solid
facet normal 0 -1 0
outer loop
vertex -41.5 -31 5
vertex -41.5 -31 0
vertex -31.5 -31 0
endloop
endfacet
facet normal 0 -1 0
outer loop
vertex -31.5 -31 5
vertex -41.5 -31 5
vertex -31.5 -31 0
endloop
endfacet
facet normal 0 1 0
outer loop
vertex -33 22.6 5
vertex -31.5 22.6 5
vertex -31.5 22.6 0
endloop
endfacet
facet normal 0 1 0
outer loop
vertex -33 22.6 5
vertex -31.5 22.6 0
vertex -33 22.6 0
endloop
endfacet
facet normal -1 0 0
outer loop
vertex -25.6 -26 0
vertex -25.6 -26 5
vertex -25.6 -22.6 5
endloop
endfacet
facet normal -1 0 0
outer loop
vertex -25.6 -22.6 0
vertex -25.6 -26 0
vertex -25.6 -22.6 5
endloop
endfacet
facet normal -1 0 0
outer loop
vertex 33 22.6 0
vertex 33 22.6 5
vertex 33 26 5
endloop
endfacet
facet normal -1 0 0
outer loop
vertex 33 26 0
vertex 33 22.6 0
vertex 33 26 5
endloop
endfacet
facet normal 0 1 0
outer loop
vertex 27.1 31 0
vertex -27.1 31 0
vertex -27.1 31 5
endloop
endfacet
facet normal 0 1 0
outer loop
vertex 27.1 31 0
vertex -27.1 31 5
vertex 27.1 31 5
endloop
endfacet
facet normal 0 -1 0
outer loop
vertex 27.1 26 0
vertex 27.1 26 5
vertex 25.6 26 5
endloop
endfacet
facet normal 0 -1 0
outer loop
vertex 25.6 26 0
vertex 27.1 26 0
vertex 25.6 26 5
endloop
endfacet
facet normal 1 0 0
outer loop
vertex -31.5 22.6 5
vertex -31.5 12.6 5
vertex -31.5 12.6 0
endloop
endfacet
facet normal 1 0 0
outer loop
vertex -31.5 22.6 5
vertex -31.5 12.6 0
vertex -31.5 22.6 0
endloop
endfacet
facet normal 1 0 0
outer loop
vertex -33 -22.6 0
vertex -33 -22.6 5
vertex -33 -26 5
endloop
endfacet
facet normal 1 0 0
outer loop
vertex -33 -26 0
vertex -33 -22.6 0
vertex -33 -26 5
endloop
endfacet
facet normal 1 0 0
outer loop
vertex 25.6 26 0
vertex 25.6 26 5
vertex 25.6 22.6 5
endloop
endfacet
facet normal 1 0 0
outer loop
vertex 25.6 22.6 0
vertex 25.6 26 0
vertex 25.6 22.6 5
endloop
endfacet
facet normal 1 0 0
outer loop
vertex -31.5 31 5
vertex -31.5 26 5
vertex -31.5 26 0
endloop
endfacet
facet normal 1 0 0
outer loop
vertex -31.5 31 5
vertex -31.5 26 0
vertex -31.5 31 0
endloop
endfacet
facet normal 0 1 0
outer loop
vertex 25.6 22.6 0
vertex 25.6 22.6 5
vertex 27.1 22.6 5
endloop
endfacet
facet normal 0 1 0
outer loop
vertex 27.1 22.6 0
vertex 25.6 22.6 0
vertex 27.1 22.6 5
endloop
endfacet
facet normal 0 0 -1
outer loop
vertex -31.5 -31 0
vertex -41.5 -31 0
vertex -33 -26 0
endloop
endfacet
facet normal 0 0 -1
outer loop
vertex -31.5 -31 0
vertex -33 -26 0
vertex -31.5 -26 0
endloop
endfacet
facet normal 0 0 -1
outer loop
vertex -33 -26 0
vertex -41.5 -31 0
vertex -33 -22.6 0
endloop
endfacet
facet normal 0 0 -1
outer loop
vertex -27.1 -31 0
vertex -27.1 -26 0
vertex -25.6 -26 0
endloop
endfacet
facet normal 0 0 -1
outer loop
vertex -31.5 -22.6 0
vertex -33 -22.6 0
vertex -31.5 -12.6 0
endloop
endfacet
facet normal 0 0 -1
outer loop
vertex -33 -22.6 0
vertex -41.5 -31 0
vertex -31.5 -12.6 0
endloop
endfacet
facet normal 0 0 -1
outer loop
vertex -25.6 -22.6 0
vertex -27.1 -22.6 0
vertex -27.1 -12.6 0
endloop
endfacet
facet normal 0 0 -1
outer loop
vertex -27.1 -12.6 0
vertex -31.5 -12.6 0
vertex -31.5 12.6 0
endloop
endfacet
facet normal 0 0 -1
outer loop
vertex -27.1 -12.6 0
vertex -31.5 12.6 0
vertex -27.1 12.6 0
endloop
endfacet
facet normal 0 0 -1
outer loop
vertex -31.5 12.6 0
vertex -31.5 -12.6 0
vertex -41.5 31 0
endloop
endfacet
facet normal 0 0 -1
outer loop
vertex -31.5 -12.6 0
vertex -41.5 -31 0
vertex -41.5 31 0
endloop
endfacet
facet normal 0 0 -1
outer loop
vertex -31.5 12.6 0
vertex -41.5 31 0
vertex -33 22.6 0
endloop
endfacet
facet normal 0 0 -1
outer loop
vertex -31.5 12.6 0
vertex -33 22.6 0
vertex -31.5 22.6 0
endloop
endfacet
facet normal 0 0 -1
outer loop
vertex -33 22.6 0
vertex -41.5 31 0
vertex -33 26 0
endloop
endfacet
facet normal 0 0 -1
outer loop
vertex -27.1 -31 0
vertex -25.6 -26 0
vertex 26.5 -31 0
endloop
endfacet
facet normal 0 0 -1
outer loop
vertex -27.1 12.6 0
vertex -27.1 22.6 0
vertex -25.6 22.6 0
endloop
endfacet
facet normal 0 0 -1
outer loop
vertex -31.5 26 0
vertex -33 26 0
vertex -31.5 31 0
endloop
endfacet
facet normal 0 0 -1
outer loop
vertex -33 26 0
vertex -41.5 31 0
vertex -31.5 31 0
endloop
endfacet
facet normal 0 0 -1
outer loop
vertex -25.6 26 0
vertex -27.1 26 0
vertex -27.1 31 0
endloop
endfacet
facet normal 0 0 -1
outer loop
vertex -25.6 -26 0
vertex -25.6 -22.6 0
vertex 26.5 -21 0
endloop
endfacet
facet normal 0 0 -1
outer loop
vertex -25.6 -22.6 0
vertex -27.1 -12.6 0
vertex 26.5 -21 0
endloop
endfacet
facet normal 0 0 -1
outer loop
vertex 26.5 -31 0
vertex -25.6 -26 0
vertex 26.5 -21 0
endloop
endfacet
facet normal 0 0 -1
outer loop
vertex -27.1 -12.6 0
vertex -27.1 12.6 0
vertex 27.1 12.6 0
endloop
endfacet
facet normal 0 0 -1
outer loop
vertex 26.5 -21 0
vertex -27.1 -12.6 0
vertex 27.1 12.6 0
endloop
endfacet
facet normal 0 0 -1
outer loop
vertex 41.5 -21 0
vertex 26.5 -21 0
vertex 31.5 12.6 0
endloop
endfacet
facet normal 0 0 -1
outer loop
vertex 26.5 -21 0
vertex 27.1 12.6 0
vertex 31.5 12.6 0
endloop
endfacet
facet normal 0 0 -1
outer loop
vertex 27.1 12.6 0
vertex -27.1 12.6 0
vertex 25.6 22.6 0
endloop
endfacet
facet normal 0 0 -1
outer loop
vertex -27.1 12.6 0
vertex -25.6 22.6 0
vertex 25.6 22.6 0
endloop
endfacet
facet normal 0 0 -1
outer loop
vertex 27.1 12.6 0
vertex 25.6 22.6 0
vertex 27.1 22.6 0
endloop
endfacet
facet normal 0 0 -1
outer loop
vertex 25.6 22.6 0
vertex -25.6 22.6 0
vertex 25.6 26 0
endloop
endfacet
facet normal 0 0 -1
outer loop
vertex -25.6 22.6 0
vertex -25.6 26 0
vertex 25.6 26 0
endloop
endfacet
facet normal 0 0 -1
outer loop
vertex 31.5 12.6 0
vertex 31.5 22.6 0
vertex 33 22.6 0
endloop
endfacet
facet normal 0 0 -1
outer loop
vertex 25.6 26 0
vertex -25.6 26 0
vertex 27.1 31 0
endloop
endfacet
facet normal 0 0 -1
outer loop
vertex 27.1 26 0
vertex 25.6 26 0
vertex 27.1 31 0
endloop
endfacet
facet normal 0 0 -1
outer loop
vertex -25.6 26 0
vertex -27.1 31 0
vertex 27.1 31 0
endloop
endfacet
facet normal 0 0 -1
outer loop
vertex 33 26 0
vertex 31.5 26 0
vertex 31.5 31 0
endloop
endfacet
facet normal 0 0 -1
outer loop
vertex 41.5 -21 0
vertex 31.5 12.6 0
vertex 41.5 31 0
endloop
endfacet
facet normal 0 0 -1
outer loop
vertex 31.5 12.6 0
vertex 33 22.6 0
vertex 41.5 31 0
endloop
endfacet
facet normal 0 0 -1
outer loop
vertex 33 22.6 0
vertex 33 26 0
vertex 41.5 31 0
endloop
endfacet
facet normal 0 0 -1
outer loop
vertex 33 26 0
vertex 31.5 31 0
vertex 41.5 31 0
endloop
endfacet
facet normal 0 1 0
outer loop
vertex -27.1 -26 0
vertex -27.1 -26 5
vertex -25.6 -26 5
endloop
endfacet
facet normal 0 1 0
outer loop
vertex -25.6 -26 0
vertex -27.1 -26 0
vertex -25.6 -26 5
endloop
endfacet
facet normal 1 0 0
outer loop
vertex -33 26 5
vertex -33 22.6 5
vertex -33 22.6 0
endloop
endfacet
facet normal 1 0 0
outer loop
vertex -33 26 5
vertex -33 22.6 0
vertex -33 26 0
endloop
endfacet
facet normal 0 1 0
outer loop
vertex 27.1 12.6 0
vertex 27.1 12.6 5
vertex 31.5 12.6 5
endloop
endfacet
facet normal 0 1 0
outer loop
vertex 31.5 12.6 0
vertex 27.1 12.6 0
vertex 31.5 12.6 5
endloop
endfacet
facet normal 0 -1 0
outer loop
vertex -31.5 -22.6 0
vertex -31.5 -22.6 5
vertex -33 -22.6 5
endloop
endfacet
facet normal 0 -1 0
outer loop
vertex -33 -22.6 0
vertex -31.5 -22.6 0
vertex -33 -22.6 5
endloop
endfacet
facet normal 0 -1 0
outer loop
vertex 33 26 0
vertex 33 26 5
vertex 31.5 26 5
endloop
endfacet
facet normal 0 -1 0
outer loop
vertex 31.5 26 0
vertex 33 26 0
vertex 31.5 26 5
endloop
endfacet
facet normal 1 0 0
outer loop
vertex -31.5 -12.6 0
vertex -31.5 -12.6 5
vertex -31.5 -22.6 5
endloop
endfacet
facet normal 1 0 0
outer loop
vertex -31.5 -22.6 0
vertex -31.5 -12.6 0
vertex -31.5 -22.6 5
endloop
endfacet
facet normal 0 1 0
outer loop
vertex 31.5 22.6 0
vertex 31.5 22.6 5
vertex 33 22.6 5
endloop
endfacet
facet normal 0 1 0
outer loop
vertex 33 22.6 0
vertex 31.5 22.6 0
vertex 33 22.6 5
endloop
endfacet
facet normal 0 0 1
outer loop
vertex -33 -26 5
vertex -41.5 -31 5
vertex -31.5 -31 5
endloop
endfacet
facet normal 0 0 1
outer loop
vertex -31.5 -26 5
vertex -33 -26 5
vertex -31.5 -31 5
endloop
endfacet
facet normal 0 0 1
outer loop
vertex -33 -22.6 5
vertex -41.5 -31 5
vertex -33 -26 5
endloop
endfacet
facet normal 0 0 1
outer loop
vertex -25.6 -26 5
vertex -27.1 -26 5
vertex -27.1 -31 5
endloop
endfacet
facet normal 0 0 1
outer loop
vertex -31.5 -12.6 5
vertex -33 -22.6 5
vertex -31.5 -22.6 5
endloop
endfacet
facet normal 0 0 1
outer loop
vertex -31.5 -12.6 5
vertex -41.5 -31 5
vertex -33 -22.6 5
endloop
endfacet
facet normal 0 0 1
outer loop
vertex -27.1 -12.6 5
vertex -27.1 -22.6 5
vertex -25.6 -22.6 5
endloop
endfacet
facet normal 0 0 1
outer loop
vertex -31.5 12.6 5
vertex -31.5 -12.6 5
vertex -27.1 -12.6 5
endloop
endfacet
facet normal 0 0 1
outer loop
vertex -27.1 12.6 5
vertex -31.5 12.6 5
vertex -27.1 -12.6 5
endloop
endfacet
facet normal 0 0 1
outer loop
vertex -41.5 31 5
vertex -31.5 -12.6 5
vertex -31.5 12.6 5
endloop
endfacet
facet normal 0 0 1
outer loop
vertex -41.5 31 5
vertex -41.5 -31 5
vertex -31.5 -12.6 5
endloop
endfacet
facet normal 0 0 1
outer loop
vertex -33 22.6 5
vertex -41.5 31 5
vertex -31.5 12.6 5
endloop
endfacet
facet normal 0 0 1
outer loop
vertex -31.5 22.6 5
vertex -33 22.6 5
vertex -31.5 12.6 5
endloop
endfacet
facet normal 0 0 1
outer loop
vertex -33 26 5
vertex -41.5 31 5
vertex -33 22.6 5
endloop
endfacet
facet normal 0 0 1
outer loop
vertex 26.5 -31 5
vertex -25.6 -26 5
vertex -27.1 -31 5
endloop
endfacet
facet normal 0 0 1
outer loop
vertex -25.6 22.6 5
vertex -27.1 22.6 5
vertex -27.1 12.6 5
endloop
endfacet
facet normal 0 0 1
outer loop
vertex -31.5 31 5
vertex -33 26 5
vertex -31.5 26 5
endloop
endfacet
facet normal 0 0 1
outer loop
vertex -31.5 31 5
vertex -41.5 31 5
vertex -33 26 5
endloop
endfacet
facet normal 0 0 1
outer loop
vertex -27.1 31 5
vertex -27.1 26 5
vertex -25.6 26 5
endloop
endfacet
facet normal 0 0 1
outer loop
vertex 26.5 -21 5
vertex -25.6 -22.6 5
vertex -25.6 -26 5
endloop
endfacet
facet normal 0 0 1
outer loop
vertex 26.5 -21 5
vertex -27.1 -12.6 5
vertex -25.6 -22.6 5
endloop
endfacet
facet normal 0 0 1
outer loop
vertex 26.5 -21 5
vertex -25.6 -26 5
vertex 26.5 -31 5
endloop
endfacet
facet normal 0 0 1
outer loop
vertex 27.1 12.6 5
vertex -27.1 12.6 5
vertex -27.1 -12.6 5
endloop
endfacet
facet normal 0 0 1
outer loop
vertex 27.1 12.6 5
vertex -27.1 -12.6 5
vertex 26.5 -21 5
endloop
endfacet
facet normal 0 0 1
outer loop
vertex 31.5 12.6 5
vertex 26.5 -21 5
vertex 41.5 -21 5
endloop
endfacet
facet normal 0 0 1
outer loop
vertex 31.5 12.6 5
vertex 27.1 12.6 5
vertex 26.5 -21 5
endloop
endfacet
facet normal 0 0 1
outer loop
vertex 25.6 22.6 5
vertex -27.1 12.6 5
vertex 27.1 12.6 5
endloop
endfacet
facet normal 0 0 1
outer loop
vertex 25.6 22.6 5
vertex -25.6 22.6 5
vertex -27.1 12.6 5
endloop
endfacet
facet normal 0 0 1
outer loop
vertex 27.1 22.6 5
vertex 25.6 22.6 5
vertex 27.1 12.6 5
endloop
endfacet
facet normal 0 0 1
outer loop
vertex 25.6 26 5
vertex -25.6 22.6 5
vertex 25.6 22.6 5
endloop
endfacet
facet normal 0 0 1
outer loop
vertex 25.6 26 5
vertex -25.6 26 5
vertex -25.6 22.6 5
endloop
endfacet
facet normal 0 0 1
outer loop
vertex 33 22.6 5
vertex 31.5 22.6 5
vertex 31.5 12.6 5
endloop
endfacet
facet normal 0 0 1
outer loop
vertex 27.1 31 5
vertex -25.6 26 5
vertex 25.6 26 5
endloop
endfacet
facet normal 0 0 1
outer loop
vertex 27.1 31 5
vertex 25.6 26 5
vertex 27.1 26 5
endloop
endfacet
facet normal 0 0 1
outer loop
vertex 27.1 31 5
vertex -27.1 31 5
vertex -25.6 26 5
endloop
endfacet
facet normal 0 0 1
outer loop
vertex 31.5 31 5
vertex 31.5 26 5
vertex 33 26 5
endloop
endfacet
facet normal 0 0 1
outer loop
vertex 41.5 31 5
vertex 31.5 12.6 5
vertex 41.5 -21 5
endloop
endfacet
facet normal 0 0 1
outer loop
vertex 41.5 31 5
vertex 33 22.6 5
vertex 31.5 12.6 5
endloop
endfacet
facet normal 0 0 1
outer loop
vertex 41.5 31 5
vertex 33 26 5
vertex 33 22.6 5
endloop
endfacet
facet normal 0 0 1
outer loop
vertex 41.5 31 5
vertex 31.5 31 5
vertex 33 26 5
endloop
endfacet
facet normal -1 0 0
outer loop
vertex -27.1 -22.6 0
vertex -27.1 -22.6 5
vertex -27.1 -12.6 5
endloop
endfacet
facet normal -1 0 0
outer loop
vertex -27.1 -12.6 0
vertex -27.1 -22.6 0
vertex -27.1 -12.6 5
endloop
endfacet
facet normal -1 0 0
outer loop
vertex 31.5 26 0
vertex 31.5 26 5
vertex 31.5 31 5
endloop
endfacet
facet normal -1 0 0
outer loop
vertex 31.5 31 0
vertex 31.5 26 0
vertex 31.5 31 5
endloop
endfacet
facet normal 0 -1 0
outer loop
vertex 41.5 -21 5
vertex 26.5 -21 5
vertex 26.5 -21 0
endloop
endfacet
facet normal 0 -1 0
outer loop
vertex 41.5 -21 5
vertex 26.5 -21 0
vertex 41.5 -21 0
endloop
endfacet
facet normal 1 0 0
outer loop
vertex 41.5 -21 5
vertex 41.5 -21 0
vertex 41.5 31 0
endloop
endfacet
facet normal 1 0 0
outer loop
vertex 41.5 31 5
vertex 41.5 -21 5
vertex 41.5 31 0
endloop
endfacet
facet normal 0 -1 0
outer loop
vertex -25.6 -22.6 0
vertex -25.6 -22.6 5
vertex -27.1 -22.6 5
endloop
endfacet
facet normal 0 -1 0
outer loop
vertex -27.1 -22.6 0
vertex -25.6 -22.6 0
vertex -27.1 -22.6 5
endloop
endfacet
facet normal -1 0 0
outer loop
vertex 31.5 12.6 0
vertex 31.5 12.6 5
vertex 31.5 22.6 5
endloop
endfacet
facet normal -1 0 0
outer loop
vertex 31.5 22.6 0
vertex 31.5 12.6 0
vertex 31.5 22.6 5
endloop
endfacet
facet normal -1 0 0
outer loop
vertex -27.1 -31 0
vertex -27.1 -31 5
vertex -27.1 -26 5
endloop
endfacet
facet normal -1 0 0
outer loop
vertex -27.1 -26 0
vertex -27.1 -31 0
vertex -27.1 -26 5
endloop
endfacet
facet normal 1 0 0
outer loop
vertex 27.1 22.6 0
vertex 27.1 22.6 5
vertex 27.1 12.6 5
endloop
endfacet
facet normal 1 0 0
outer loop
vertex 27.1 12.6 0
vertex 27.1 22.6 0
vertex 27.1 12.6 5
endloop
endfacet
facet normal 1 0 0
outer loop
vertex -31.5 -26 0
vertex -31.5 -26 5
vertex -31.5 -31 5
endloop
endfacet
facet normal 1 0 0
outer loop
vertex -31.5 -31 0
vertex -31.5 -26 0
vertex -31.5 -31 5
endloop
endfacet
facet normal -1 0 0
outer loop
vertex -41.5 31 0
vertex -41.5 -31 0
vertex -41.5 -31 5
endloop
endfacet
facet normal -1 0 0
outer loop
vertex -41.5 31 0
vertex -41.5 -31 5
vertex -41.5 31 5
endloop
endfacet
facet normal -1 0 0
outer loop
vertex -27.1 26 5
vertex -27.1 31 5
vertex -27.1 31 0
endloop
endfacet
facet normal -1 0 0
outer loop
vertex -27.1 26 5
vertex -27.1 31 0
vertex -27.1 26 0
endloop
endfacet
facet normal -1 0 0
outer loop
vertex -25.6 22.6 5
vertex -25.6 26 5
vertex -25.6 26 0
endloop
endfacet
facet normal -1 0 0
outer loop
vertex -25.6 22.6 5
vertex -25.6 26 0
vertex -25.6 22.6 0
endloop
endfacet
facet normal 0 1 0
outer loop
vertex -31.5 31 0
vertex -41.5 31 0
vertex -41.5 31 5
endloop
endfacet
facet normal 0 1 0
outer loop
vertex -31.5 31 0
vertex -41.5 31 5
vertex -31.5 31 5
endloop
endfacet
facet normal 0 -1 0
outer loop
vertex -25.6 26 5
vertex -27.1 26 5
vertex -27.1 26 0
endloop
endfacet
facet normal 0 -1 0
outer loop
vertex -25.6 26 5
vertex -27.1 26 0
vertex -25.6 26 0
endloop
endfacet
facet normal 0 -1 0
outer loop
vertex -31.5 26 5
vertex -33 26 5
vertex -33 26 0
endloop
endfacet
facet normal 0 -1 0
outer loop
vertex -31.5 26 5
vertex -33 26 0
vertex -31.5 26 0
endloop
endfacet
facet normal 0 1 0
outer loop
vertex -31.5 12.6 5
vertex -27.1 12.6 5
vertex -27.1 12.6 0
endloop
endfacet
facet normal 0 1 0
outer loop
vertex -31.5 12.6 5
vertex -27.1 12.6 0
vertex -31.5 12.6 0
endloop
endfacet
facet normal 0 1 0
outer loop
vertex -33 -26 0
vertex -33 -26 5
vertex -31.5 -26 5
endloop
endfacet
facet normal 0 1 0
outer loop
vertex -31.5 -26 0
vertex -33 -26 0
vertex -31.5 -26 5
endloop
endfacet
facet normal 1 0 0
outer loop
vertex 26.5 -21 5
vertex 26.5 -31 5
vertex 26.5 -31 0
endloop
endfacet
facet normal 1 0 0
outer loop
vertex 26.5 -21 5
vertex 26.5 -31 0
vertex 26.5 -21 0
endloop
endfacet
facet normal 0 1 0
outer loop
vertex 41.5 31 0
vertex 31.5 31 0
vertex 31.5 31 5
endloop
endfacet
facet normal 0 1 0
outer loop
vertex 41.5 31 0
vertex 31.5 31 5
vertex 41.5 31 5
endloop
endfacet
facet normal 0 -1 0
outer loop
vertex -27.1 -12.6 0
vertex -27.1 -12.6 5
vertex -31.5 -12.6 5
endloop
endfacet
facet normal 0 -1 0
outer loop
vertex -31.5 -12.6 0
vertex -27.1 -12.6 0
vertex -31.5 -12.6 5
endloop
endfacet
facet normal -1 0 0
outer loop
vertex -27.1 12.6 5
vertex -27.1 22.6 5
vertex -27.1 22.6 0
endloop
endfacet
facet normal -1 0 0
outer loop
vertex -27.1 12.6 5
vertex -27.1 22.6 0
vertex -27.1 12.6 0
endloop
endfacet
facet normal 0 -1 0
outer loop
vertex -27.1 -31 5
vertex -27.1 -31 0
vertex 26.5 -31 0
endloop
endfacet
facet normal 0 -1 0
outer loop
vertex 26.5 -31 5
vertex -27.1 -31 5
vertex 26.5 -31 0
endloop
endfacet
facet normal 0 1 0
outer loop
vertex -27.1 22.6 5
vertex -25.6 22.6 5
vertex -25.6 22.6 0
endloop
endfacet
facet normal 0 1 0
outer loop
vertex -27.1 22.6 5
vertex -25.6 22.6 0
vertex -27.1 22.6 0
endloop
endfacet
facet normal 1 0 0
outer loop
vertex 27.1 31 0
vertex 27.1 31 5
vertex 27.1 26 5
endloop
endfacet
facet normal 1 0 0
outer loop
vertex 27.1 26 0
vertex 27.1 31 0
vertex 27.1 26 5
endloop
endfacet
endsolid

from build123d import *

# Parameters (mm, degrees)
SKETCH1_W           = 83
SKETCH1_H           = 62
BOSS_EXTRUDE1_DEPTH = 5
SKETCH2_W           = 15
SKETCH2_H           = 10
CUT_EXTRUDE1_DEPTH  = 10
CUT_EXTRUDE2_DEPTH  = 5


with BuildPart() as part:
    # Sketch1 → Boss-Extrude1 (new body)
    with BuildSketch(Plane.XY):
        Rectangle(SKETCH1_W, SKETCH1_H)
    extrude(amount=BOSS_EXTRUDE1_DEPTH)

    # Sketch2 → Cut-Extrude1 (cut)
    with BuildSketch(Plane.XY.offset(5)):
        with Locations((34, -26)):
            Rectangle(SKETCH2_W, SKETCH2_H)
    extrude(amount=-CUT_EXTRUDE1_DEPTH, mode=Mode.SUBTRACT)

    # Sketch3 → Cut-Extrude2 (cut)
    with BuildSketch(Plane.XY.offset(5)):
        Polygon((-27.1, 22.6), (-27.1, 12.6), (-31.5, 12.6), (-31.5, 22.6), (-33, 22.6), (-33, 26), (-31.5, 26), (-31.5, 31), (-27.1, 31), (-27.1, 26), (-25.6, 26), (-25.6, 22.6), align=None)
        Polygon((31.5, 12.6), (31.5, 22.6), (33, 22.6), (33, 26), (31.5, 26), (31.5, 31), (27.1, 31), (27.1, 26), (25.6, 26), (25.6, 22.6), (27.1, 22.6), (27.1, 12.6), align=None)
        Polygon((-31.5, -12.6), (-31.5, -22.6), (-33, -22.6), (-33, -26), (-31.5, -26), (-31.5, -31), (-27.1, -31), (-27.1, -26), (-25.6, -26), (-25.6, -22.6), (-27.1, -22.6), (-27.1, -12.6), align=None)
    extrude(amount=-CUT_EXTRUDE2_DEPTH, mode=Mode.SUBTRACT)


solid = part.part
